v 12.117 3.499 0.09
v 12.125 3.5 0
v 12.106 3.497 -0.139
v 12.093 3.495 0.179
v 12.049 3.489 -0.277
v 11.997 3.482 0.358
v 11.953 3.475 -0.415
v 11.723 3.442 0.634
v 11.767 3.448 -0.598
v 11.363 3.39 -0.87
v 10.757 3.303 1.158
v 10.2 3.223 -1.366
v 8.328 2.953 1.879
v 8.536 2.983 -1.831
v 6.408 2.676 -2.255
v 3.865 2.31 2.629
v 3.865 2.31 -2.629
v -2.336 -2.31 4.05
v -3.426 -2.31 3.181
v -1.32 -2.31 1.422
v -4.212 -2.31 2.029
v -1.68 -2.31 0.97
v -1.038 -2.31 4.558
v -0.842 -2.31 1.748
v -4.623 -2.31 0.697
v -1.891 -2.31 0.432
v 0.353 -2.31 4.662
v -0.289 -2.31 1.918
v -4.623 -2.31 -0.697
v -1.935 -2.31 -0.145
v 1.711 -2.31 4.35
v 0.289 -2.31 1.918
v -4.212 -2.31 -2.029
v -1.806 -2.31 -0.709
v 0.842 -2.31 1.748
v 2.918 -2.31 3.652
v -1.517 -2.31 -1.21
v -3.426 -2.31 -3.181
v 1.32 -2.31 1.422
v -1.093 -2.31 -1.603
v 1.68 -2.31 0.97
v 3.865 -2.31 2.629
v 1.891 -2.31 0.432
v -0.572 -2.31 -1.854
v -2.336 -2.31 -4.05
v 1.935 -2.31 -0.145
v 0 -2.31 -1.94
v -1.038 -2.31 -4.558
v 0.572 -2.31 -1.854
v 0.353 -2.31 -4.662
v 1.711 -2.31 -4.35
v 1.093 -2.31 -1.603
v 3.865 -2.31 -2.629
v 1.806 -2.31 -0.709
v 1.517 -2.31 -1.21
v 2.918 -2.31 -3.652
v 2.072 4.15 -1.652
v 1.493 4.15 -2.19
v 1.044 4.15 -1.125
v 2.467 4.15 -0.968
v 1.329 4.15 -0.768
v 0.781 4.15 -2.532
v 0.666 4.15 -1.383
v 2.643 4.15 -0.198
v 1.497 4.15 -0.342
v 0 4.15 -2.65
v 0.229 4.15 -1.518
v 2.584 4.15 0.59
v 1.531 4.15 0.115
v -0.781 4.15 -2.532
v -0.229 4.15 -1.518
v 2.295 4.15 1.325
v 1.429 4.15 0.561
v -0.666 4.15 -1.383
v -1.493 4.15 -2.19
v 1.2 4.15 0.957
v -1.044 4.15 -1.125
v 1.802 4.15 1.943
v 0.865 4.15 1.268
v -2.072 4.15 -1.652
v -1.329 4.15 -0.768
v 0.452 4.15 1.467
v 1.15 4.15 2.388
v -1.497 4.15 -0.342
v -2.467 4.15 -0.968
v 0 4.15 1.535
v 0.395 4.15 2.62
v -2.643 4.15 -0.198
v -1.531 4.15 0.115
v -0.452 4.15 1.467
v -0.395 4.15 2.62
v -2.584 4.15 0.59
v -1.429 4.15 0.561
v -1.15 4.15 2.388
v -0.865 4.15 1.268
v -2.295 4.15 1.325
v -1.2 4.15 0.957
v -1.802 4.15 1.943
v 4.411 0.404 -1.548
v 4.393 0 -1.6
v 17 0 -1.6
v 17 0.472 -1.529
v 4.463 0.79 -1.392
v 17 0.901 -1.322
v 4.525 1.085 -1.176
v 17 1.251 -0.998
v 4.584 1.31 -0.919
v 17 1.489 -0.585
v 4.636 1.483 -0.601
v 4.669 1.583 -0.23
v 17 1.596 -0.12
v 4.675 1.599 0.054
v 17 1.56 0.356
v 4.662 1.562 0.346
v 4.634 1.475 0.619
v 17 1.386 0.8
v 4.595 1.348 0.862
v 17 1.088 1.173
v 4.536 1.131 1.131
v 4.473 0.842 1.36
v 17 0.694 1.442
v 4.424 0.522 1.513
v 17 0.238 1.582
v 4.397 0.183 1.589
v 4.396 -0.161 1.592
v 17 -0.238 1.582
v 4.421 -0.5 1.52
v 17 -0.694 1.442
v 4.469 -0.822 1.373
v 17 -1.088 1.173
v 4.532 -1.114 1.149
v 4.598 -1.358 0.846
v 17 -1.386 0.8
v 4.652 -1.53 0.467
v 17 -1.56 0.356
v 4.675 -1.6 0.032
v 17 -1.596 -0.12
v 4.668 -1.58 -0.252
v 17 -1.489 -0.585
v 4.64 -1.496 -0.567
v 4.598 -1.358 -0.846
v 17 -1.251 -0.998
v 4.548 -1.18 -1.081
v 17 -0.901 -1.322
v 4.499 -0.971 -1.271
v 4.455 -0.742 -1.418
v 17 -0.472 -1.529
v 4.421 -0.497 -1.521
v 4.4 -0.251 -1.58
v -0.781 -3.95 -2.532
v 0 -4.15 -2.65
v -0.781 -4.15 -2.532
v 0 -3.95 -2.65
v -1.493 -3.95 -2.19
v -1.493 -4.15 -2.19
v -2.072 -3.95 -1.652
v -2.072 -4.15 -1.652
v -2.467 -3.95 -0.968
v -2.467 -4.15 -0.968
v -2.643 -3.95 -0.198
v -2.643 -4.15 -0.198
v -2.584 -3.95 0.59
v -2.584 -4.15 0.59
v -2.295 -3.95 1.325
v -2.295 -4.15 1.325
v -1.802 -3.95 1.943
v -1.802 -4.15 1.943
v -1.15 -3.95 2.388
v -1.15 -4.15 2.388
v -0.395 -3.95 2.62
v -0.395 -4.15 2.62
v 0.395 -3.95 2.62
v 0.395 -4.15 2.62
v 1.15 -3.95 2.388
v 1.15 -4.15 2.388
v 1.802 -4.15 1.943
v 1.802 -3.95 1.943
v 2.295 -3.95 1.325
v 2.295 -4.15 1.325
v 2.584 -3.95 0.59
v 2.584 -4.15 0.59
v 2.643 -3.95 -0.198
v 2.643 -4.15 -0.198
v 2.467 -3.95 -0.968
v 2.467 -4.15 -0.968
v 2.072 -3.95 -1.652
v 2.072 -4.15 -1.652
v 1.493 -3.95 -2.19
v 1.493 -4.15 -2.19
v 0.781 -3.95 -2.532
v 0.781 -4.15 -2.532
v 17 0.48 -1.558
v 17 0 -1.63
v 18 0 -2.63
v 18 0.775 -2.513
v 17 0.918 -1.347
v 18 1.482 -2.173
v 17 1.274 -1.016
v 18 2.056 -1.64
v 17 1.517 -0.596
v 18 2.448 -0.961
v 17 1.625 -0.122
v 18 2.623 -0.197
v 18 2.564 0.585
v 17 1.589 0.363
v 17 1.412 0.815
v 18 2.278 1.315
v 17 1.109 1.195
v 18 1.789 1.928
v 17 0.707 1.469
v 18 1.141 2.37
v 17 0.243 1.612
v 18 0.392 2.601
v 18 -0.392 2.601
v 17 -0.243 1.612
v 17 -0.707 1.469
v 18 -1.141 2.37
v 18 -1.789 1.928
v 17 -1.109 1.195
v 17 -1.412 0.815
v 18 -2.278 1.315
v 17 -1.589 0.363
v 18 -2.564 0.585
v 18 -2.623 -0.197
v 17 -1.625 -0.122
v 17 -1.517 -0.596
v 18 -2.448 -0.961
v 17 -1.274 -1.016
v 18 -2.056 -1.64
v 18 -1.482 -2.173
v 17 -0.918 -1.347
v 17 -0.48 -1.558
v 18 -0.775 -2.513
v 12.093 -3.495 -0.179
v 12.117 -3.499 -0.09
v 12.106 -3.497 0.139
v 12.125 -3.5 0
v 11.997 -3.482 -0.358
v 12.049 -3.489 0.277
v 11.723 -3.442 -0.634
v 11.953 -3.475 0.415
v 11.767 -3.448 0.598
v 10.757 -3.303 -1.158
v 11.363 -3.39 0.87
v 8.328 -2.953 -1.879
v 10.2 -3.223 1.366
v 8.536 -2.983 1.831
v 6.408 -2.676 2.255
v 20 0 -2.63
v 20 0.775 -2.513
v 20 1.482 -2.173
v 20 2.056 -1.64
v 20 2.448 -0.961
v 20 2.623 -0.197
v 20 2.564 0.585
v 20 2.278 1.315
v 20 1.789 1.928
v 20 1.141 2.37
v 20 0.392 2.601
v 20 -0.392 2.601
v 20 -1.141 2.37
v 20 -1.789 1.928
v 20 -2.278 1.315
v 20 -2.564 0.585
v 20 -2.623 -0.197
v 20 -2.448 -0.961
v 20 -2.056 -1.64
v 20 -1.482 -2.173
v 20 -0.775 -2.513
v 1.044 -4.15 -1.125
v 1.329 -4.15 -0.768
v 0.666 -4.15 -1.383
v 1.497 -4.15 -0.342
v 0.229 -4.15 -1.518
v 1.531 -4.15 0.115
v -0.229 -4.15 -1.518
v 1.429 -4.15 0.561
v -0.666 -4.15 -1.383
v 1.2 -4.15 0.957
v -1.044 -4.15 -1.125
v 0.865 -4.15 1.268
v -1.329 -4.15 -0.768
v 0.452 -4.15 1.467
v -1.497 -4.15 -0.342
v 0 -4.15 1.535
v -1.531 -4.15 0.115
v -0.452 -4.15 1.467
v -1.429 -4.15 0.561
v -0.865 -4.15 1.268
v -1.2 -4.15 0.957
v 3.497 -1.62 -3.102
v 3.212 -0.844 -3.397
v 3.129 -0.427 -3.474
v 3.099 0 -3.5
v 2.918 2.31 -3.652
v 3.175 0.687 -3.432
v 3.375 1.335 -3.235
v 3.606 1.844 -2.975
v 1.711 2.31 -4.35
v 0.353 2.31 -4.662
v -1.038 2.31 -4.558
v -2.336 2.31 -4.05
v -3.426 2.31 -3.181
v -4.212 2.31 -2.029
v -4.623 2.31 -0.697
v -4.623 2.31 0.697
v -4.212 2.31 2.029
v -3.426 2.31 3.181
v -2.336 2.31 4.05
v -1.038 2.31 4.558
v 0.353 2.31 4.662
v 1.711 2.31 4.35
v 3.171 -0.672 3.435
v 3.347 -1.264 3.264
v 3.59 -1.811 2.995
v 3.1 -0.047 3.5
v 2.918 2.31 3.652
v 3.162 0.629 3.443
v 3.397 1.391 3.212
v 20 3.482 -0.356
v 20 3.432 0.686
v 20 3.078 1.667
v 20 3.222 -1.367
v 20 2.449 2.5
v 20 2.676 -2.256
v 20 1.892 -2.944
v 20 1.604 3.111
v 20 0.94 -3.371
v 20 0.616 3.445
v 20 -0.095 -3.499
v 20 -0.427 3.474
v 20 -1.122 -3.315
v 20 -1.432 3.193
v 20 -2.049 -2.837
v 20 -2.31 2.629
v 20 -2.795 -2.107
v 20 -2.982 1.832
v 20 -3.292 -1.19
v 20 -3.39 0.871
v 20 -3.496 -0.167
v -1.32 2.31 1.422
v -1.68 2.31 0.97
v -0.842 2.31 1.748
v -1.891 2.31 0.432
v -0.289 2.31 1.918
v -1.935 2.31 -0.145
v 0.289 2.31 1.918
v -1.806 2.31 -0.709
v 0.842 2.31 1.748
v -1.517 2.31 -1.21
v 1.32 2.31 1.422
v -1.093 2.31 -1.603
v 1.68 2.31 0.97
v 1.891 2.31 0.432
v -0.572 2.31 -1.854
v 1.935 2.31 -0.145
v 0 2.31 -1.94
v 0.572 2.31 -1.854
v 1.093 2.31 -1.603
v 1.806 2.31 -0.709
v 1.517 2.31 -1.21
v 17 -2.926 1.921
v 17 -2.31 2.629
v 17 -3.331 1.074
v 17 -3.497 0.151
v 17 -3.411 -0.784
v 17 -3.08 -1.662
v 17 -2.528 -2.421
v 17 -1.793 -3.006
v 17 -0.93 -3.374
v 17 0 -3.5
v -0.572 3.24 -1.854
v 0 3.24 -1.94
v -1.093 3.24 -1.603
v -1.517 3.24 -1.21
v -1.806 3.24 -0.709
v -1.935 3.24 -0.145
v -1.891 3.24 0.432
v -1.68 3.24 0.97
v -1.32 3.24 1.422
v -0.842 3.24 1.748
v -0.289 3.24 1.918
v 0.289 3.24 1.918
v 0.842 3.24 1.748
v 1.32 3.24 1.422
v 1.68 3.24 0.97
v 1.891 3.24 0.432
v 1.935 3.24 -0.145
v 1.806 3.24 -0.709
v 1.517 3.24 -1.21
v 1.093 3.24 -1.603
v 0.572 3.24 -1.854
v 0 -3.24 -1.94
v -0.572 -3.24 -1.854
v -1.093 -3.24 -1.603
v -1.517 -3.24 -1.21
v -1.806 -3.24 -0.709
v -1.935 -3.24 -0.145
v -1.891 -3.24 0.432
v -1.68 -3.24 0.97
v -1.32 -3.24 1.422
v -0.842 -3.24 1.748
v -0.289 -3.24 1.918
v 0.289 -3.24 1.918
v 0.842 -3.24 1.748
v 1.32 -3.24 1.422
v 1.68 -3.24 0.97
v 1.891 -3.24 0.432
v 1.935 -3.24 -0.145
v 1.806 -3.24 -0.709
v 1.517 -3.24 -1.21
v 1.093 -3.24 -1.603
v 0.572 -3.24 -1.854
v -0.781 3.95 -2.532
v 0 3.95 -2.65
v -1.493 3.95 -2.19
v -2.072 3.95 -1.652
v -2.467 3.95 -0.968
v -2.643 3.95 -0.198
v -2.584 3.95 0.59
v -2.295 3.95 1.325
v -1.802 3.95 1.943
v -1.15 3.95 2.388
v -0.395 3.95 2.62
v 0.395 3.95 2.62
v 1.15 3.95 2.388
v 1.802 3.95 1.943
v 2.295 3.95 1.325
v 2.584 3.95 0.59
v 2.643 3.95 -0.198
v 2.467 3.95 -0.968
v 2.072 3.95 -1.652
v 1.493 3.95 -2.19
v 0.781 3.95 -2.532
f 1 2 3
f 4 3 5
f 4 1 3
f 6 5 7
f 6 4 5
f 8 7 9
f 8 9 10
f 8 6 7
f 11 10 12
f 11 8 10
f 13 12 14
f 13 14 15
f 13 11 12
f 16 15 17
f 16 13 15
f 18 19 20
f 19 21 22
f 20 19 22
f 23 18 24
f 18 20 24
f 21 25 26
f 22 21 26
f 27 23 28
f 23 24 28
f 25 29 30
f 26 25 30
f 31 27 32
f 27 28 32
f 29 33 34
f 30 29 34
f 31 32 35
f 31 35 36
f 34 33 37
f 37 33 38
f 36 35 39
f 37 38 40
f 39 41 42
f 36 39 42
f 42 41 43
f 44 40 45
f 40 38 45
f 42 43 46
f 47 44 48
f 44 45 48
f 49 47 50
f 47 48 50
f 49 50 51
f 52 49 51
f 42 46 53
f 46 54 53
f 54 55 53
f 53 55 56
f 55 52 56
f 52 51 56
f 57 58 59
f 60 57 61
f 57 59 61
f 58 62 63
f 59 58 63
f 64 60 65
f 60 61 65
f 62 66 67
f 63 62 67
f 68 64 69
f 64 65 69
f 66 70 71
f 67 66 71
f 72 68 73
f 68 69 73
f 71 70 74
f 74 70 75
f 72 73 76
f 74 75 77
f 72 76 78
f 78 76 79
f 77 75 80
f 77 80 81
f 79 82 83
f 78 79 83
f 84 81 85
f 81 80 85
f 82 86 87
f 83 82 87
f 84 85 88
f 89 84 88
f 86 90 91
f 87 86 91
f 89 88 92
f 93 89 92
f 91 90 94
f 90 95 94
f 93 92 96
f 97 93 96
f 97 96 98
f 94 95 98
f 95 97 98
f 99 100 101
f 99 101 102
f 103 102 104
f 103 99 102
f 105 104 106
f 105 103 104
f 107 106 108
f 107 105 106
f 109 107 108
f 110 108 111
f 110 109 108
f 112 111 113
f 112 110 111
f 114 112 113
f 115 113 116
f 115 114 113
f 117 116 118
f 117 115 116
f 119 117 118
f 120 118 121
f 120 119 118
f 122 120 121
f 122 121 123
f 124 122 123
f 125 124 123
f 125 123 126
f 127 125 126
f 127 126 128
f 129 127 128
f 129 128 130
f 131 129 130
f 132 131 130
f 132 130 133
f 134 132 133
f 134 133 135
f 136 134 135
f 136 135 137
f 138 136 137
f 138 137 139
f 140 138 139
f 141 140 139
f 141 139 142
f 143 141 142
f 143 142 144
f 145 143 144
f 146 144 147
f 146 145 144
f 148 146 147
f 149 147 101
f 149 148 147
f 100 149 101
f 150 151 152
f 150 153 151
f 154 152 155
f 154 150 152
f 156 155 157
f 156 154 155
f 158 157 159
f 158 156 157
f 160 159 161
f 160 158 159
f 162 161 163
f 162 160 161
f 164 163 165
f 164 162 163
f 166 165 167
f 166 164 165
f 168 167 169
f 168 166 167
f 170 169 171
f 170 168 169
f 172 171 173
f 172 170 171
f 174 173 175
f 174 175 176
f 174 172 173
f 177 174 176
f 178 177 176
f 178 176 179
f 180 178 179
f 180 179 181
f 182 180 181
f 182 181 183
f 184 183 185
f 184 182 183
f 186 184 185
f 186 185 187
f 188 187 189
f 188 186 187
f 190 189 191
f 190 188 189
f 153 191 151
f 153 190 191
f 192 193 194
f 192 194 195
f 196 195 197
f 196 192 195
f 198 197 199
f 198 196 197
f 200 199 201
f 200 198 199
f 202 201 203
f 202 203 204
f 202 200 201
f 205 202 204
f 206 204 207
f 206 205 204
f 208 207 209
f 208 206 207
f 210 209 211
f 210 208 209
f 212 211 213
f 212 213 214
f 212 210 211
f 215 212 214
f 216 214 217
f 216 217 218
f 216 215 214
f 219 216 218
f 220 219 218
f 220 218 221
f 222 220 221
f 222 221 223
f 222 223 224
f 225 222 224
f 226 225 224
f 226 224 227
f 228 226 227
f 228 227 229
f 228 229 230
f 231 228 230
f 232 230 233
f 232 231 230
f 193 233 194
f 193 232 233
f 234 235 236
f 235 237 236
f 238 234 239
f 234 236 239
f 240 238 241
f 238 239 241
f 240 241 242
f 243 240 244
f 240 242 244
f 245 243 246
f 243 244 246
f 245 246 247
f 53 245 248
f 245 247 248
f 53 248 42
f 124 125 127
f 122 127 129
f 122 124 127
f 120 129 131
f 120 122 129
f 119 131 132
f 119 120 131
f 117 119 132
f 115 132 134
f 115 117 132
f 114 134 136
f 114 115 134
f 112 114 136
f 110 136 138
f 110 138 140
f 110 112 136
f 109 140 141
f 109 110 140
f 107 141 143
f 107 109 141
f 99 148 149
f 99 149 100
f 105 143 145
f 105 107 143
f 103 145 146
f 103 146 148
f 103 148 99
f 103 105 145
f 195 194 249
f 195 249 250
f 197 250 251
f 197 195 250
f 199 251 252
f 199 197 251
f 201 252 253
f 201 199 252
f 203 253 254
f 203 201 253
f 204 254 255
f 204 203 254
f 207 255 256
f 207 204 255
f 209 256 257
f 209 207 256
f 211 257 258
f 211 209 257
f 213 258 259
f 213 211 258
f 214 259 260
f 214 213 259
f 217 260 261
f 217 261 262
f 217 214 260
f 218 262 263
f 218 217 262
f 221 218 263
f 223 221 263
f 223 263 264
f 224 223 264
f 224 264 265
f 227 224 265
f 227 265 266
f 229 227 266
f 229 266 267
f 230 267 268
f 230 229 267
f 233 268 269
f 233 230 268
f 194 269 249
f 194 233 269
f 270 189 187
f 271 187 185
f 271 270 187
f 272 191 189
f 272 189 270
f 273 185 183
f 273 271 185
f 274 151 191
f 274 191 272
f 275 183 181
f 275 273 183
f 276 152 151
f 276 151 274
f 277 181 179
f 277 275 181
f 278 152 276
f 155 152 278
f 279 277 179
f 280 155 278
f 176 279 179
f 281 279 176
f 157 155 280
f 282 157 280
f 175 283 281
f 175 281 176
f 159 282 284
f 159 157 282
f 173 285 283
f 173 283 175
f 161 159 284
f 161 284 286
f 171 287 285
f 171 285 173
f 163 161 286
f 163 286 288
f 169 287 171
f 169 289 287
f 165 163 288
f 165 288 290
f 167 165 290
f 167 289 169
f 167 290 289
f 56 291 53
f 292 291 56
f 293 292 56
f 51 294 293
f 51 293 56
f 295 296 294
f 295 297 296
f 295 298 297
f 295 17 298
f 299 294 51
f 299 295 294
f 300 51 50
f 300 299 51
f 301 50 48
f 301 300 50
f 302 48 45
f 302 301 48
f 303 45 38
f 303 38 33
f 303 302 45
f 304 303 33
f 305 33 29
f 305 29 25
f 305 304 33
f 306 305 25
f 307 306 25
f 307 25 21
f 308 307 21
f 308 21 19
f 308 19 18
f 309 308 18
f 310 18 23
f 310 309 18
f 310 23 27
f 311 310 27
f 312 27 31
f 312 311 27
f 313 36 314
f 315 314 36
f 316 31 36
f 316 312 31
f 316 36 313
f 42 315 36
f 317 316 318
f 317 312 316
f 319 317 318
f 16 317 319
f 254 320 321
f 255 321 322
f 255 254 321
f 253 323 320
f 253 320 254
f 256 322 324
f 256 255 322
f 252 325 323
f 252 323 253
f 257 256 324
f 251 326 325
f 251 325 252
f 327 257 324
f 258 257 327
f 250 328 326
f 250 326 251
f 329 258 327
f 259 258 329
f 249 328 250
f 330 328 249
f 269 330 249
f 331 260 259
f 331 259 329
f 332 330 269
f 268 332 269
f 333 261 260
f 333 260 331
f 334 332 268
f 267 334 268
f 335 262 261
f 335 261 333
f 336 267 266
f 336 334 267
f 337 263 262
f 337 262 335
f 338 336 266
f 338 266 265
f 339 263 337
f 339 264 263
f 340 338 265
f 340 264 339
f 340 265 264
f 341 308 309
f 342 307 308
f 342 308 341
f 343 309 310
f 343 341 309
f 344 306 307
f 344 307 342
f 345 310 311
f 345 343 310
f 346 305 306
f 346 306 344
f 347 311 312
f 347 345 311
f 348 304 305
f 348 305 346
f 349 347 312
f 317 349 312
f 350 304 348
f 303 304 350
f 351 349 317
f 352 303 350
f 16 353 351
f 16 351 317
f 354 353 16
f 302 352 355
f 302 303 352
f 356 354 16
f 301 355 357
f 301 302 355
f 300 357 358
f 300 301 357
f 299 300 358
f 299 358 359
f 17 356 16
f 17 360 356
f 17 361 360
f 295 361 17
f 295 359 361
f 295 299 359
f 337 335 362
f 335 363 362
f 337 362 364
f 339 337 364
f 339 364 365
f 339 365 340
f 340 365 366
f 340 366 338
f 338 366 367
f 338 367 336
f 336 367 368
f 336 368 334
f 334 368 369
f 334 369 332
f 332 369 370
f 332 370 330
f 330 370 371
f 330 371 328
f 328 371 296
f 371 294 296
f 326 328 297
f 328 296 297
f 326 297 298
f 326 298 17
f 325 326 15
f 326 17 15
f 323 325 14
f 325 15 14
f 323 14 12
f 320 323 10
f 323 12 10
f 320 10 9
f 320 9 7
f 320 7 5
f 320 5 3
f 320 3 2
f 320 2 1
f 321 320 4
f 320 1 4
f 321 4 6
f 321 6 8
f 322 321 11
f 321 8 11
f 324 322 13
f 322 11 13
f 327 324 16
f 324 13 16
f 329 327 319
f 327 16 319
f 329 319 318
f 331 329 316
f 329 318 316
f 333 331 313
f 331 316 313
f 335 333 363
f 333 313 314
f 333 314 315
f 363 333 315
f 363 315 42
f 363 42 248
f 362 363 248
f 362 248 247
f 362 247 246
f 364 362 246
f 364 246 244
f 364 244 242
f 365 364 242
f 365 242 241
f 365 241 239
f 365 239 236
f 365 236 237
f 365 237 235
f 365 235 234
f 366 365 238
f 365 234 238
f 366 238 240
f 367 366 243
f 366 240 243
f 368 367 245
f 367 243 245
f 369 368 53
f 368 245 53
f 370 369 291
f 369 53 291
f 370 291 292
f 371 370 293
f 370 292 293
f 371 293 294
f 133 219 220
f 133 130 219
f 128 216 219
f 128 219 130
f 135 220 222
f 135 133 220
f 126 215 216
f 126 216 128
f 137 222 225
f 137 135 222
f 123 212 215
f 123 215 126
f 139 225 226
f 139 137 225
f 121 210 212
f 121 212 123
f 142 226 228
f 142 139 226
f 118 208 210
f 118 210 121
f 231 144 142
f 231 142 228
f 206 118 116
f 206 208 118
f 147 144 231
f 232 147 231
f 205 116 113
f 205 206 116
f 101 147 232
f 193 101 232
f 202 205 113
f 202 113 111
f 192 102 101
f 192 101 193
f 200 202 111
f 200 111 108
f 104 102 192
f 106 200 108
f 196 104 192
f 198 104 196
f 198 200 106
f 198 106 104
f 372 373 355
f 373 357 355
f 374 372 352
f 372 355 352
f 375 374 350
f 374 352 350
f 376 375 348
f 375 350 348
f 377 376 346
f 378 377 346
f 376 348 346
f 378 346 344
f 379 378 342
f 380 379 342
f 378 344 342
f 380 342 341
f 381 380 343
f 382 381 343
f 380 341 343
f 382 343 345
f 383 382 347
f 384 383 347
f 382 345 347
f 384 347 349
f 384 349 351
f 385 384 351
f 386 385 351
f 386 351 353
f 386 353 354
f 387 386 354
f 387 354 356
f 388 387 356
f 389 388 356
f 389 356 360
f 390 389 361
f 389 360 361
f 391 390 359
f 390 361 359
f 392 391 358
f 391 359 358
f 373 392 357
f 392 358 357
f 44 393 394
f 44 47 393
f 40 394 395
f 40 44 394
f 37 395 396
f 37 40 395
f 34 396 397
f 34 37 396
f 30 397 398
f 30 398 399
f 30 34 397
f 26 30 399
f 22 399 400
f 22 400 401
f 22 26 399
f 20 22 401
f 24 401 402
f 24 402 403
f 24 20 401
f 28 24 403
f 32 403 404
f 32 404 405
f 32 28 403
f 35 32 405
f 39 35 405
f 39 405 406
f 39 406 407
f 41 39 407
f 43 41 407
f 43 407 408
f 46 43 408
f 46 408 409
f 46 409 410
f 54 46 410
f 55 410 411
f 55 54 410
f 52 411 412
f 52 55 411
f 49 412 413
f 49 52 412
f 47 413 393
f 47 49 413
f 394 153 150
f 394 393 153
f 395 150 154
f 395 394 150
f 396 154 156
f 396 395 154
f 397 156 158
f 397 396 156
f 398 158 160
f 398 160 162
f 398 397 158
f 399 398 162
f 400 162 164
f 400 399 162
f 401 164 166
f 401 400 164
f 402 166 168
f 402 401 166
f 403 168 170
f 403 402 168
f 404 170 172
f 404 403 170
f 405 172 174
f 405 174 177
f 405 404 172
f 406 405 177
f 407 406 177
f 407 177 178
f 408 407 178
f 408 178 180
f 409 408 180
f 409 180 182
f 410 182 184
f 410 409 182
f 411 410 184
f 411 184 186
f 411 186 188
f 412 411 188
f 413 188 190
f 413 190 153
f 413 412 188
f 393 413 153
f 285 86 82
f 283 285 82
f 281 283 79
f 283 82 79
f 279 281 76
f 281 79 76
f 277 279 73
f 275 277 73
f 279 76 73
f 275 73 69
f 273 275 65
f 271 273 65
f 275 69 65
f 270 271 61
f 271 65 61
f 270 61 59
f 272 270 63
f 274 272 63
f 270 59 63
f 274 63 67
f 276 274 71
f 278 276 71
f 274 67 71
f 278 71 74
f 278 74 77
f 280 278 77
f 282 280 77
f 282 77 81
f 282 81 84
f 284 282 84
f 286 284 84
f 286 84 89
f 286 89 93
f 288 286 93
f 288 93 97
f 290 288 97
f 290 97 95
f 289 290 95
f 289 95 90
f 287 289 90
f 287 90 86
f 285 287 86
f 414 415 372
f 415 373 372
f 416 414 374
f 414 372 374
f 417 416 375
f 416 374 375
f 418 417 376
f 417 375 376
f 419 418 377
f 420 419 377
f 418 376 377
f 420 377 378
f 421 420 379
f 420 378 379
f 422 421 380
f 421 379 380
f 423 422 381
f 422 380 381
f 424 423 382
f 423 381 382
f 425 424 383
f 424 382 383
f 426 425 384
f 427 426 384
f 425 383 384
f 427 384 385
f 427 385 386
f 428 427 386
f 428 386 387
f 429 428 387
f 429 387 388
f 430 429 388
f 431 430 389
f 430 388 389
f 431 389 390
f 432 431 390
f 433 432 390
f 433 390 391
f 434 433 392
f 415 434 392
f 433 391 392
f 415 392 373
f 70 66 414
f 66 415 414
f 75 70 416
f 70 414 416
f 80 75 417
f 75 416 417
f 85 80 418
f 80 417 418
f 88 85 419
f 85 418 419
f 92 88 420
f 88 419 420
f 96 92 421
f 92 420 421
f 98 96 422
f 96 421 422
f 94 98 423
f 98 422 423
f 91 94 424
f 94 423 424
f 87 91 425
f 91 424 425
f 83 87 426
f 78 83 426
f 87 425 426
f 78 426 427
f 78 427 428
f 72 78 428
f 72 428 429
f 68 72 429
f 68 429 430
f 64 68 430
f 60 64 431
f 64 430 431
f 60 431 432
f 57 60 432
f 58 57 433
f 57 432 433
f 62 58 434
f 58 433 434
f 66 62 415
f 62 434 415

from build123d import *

# Parameters (mm, degrees)
SKETCH1_R           = 3.5
SKETCH1_R_2         = 2.63
SKETCH1_R_3         = 1.6
BOSS_EXTRUDE1_DEPTH = 17
SKETCH2_R           = 4.675
BOSS_EXTRUDE2_DEPTH = 2.31
CUT_EXTRUDE1_DEPTH  = 18.975139222
BOSS_EXTRUDE3_START = 17
SKETCH1_3_R         = 3.5
SKETCH1_3_R_2       = 2.63
BOSS_EXTRUDE3_DEPTH = 3
SKETCH5_R           = 1.535
CUT_EXTRUDE2_DEPTH  = 23.152779282
CHAMFER1_SIZE       = 1


with BuildPart() as part:
    # Sketch1 → Boss-Extrude1 (new body)
    # profile 1 of 2: a face of its own
    with BuildSketch(Plane(origin=(0, 0, 0), x_dir=(0, 0, -1), z_dir=(1, 0, 0))):
        Circle(SKETCH1_R)
        Circle(SKETCH1_R_2, mode=Mode.SUBTRACT)
    # profile 2 of 2: a face of its own
    with BuildSketch(Plane(origin=(0, 0, 0), x_dir=(0, 0, -1), z_dir=(1, 0, 0))):
        Circle(SKETCH1_R_2)
        Circle(SKETCH1_R_3, mode=Mode.SUBTRACT)
    extrude(amount=BOSS_EXTRUDE1_DEPTH)

    # Sketch2 → Boss-Extrude2 (add, symmetric)
    with BuildSketch(Plane(origin=(0, 0, 0), x_dir=(1, 0, 0), z_dir=(0, 1, 0))):
        Circle(SKETCH2_R)
    extrude(amount=BOSS_EXTRUDE2_DEPTH, both=True)

    # Sketch3 → Cut-Extrude1 (cut, symmetric)
    with BuildSketch(Plane.XY):
        Polygon((66.444481418, 11.326116973), (12.125, 3.5), (3.865452755, 2.31), (-4.675, 2.31), (-59.55536232, 2.31), (-67.389432633, 111.790792909), (58.610411105, 120.806909882), align=None)
    cut_extrude1 = extrude(amount=CUT_EXTRUDE1_DEPTH, both=True, mode=Mode.SUBTRACT)

    # Mirror1: Cut-Extrude1 across plane
    add(cut_extrude1.mirror(Plane.ZX), mode=Mode.SUBTRACT)

    # Sketch1<3> → Boss-Extrude3 (add)
    with BuildSketch(Plane(origin=(0, 0, 0), x_dir=(0, 0, -1), z_dir=(1, 0, 0)).offset(BOSS_EXTRUDE3_START)):
        with Locations(Location((0, 0, 0), (0, 0, 221.299872792))):
            Circle(SKETCH1_3_R)
        Circle(SKETCH1_3_R_2, mode=Mode.SUBTRACT)
    extrude(amount=BOSS_EXTRUDE3_DEPTH)

    # Sketch4 → Revolve1 (revolve)
    with BuildSketch(Plane.XY, mode=Mode.PRIVATE) as revolve1_sk:
        Polygon((0, 4.15), (2.65, 4.15), (2.65, 3.95), (1.94, 3.24), (1.94, 2.31), (0, 2.31), align=None)
    revolve1 = revolve(revolve1_sk.sketch.rotate(Axis((0, 2.31, 0), (0, 1, 0)), 90), axis=Axis((0, 2.31, 0), (0, 1, 0)))

    # Mirror2: Revolve1 across plane
    add(revolve1.mirror(Plane.ZX))

    # Sketch5 → Cut-Extrude2 (cut, through all)
    with BuildSketch(Plane(origin=(0, 4.15, 0), x_dir=(1, 0, 0), z_dir=(0, 1, 0))):
        with Locations(Location((0, 0, 0), (0, 0, 270))):
            Circle(SKETCH5_R)
    extrude(amount=-CUT_EXTRUDE2_DEPTH, mode=Mode.SUBTRACT)

    # Chamfer1
    chamfer1_edges = [part.edges().sort_by_distance(p)[0] for p in [
        (17, 0, 2.63),
    ]]
    chamfer(chamfer1_edges, length=CHAMFER1_SIZE)


solid = part.part
